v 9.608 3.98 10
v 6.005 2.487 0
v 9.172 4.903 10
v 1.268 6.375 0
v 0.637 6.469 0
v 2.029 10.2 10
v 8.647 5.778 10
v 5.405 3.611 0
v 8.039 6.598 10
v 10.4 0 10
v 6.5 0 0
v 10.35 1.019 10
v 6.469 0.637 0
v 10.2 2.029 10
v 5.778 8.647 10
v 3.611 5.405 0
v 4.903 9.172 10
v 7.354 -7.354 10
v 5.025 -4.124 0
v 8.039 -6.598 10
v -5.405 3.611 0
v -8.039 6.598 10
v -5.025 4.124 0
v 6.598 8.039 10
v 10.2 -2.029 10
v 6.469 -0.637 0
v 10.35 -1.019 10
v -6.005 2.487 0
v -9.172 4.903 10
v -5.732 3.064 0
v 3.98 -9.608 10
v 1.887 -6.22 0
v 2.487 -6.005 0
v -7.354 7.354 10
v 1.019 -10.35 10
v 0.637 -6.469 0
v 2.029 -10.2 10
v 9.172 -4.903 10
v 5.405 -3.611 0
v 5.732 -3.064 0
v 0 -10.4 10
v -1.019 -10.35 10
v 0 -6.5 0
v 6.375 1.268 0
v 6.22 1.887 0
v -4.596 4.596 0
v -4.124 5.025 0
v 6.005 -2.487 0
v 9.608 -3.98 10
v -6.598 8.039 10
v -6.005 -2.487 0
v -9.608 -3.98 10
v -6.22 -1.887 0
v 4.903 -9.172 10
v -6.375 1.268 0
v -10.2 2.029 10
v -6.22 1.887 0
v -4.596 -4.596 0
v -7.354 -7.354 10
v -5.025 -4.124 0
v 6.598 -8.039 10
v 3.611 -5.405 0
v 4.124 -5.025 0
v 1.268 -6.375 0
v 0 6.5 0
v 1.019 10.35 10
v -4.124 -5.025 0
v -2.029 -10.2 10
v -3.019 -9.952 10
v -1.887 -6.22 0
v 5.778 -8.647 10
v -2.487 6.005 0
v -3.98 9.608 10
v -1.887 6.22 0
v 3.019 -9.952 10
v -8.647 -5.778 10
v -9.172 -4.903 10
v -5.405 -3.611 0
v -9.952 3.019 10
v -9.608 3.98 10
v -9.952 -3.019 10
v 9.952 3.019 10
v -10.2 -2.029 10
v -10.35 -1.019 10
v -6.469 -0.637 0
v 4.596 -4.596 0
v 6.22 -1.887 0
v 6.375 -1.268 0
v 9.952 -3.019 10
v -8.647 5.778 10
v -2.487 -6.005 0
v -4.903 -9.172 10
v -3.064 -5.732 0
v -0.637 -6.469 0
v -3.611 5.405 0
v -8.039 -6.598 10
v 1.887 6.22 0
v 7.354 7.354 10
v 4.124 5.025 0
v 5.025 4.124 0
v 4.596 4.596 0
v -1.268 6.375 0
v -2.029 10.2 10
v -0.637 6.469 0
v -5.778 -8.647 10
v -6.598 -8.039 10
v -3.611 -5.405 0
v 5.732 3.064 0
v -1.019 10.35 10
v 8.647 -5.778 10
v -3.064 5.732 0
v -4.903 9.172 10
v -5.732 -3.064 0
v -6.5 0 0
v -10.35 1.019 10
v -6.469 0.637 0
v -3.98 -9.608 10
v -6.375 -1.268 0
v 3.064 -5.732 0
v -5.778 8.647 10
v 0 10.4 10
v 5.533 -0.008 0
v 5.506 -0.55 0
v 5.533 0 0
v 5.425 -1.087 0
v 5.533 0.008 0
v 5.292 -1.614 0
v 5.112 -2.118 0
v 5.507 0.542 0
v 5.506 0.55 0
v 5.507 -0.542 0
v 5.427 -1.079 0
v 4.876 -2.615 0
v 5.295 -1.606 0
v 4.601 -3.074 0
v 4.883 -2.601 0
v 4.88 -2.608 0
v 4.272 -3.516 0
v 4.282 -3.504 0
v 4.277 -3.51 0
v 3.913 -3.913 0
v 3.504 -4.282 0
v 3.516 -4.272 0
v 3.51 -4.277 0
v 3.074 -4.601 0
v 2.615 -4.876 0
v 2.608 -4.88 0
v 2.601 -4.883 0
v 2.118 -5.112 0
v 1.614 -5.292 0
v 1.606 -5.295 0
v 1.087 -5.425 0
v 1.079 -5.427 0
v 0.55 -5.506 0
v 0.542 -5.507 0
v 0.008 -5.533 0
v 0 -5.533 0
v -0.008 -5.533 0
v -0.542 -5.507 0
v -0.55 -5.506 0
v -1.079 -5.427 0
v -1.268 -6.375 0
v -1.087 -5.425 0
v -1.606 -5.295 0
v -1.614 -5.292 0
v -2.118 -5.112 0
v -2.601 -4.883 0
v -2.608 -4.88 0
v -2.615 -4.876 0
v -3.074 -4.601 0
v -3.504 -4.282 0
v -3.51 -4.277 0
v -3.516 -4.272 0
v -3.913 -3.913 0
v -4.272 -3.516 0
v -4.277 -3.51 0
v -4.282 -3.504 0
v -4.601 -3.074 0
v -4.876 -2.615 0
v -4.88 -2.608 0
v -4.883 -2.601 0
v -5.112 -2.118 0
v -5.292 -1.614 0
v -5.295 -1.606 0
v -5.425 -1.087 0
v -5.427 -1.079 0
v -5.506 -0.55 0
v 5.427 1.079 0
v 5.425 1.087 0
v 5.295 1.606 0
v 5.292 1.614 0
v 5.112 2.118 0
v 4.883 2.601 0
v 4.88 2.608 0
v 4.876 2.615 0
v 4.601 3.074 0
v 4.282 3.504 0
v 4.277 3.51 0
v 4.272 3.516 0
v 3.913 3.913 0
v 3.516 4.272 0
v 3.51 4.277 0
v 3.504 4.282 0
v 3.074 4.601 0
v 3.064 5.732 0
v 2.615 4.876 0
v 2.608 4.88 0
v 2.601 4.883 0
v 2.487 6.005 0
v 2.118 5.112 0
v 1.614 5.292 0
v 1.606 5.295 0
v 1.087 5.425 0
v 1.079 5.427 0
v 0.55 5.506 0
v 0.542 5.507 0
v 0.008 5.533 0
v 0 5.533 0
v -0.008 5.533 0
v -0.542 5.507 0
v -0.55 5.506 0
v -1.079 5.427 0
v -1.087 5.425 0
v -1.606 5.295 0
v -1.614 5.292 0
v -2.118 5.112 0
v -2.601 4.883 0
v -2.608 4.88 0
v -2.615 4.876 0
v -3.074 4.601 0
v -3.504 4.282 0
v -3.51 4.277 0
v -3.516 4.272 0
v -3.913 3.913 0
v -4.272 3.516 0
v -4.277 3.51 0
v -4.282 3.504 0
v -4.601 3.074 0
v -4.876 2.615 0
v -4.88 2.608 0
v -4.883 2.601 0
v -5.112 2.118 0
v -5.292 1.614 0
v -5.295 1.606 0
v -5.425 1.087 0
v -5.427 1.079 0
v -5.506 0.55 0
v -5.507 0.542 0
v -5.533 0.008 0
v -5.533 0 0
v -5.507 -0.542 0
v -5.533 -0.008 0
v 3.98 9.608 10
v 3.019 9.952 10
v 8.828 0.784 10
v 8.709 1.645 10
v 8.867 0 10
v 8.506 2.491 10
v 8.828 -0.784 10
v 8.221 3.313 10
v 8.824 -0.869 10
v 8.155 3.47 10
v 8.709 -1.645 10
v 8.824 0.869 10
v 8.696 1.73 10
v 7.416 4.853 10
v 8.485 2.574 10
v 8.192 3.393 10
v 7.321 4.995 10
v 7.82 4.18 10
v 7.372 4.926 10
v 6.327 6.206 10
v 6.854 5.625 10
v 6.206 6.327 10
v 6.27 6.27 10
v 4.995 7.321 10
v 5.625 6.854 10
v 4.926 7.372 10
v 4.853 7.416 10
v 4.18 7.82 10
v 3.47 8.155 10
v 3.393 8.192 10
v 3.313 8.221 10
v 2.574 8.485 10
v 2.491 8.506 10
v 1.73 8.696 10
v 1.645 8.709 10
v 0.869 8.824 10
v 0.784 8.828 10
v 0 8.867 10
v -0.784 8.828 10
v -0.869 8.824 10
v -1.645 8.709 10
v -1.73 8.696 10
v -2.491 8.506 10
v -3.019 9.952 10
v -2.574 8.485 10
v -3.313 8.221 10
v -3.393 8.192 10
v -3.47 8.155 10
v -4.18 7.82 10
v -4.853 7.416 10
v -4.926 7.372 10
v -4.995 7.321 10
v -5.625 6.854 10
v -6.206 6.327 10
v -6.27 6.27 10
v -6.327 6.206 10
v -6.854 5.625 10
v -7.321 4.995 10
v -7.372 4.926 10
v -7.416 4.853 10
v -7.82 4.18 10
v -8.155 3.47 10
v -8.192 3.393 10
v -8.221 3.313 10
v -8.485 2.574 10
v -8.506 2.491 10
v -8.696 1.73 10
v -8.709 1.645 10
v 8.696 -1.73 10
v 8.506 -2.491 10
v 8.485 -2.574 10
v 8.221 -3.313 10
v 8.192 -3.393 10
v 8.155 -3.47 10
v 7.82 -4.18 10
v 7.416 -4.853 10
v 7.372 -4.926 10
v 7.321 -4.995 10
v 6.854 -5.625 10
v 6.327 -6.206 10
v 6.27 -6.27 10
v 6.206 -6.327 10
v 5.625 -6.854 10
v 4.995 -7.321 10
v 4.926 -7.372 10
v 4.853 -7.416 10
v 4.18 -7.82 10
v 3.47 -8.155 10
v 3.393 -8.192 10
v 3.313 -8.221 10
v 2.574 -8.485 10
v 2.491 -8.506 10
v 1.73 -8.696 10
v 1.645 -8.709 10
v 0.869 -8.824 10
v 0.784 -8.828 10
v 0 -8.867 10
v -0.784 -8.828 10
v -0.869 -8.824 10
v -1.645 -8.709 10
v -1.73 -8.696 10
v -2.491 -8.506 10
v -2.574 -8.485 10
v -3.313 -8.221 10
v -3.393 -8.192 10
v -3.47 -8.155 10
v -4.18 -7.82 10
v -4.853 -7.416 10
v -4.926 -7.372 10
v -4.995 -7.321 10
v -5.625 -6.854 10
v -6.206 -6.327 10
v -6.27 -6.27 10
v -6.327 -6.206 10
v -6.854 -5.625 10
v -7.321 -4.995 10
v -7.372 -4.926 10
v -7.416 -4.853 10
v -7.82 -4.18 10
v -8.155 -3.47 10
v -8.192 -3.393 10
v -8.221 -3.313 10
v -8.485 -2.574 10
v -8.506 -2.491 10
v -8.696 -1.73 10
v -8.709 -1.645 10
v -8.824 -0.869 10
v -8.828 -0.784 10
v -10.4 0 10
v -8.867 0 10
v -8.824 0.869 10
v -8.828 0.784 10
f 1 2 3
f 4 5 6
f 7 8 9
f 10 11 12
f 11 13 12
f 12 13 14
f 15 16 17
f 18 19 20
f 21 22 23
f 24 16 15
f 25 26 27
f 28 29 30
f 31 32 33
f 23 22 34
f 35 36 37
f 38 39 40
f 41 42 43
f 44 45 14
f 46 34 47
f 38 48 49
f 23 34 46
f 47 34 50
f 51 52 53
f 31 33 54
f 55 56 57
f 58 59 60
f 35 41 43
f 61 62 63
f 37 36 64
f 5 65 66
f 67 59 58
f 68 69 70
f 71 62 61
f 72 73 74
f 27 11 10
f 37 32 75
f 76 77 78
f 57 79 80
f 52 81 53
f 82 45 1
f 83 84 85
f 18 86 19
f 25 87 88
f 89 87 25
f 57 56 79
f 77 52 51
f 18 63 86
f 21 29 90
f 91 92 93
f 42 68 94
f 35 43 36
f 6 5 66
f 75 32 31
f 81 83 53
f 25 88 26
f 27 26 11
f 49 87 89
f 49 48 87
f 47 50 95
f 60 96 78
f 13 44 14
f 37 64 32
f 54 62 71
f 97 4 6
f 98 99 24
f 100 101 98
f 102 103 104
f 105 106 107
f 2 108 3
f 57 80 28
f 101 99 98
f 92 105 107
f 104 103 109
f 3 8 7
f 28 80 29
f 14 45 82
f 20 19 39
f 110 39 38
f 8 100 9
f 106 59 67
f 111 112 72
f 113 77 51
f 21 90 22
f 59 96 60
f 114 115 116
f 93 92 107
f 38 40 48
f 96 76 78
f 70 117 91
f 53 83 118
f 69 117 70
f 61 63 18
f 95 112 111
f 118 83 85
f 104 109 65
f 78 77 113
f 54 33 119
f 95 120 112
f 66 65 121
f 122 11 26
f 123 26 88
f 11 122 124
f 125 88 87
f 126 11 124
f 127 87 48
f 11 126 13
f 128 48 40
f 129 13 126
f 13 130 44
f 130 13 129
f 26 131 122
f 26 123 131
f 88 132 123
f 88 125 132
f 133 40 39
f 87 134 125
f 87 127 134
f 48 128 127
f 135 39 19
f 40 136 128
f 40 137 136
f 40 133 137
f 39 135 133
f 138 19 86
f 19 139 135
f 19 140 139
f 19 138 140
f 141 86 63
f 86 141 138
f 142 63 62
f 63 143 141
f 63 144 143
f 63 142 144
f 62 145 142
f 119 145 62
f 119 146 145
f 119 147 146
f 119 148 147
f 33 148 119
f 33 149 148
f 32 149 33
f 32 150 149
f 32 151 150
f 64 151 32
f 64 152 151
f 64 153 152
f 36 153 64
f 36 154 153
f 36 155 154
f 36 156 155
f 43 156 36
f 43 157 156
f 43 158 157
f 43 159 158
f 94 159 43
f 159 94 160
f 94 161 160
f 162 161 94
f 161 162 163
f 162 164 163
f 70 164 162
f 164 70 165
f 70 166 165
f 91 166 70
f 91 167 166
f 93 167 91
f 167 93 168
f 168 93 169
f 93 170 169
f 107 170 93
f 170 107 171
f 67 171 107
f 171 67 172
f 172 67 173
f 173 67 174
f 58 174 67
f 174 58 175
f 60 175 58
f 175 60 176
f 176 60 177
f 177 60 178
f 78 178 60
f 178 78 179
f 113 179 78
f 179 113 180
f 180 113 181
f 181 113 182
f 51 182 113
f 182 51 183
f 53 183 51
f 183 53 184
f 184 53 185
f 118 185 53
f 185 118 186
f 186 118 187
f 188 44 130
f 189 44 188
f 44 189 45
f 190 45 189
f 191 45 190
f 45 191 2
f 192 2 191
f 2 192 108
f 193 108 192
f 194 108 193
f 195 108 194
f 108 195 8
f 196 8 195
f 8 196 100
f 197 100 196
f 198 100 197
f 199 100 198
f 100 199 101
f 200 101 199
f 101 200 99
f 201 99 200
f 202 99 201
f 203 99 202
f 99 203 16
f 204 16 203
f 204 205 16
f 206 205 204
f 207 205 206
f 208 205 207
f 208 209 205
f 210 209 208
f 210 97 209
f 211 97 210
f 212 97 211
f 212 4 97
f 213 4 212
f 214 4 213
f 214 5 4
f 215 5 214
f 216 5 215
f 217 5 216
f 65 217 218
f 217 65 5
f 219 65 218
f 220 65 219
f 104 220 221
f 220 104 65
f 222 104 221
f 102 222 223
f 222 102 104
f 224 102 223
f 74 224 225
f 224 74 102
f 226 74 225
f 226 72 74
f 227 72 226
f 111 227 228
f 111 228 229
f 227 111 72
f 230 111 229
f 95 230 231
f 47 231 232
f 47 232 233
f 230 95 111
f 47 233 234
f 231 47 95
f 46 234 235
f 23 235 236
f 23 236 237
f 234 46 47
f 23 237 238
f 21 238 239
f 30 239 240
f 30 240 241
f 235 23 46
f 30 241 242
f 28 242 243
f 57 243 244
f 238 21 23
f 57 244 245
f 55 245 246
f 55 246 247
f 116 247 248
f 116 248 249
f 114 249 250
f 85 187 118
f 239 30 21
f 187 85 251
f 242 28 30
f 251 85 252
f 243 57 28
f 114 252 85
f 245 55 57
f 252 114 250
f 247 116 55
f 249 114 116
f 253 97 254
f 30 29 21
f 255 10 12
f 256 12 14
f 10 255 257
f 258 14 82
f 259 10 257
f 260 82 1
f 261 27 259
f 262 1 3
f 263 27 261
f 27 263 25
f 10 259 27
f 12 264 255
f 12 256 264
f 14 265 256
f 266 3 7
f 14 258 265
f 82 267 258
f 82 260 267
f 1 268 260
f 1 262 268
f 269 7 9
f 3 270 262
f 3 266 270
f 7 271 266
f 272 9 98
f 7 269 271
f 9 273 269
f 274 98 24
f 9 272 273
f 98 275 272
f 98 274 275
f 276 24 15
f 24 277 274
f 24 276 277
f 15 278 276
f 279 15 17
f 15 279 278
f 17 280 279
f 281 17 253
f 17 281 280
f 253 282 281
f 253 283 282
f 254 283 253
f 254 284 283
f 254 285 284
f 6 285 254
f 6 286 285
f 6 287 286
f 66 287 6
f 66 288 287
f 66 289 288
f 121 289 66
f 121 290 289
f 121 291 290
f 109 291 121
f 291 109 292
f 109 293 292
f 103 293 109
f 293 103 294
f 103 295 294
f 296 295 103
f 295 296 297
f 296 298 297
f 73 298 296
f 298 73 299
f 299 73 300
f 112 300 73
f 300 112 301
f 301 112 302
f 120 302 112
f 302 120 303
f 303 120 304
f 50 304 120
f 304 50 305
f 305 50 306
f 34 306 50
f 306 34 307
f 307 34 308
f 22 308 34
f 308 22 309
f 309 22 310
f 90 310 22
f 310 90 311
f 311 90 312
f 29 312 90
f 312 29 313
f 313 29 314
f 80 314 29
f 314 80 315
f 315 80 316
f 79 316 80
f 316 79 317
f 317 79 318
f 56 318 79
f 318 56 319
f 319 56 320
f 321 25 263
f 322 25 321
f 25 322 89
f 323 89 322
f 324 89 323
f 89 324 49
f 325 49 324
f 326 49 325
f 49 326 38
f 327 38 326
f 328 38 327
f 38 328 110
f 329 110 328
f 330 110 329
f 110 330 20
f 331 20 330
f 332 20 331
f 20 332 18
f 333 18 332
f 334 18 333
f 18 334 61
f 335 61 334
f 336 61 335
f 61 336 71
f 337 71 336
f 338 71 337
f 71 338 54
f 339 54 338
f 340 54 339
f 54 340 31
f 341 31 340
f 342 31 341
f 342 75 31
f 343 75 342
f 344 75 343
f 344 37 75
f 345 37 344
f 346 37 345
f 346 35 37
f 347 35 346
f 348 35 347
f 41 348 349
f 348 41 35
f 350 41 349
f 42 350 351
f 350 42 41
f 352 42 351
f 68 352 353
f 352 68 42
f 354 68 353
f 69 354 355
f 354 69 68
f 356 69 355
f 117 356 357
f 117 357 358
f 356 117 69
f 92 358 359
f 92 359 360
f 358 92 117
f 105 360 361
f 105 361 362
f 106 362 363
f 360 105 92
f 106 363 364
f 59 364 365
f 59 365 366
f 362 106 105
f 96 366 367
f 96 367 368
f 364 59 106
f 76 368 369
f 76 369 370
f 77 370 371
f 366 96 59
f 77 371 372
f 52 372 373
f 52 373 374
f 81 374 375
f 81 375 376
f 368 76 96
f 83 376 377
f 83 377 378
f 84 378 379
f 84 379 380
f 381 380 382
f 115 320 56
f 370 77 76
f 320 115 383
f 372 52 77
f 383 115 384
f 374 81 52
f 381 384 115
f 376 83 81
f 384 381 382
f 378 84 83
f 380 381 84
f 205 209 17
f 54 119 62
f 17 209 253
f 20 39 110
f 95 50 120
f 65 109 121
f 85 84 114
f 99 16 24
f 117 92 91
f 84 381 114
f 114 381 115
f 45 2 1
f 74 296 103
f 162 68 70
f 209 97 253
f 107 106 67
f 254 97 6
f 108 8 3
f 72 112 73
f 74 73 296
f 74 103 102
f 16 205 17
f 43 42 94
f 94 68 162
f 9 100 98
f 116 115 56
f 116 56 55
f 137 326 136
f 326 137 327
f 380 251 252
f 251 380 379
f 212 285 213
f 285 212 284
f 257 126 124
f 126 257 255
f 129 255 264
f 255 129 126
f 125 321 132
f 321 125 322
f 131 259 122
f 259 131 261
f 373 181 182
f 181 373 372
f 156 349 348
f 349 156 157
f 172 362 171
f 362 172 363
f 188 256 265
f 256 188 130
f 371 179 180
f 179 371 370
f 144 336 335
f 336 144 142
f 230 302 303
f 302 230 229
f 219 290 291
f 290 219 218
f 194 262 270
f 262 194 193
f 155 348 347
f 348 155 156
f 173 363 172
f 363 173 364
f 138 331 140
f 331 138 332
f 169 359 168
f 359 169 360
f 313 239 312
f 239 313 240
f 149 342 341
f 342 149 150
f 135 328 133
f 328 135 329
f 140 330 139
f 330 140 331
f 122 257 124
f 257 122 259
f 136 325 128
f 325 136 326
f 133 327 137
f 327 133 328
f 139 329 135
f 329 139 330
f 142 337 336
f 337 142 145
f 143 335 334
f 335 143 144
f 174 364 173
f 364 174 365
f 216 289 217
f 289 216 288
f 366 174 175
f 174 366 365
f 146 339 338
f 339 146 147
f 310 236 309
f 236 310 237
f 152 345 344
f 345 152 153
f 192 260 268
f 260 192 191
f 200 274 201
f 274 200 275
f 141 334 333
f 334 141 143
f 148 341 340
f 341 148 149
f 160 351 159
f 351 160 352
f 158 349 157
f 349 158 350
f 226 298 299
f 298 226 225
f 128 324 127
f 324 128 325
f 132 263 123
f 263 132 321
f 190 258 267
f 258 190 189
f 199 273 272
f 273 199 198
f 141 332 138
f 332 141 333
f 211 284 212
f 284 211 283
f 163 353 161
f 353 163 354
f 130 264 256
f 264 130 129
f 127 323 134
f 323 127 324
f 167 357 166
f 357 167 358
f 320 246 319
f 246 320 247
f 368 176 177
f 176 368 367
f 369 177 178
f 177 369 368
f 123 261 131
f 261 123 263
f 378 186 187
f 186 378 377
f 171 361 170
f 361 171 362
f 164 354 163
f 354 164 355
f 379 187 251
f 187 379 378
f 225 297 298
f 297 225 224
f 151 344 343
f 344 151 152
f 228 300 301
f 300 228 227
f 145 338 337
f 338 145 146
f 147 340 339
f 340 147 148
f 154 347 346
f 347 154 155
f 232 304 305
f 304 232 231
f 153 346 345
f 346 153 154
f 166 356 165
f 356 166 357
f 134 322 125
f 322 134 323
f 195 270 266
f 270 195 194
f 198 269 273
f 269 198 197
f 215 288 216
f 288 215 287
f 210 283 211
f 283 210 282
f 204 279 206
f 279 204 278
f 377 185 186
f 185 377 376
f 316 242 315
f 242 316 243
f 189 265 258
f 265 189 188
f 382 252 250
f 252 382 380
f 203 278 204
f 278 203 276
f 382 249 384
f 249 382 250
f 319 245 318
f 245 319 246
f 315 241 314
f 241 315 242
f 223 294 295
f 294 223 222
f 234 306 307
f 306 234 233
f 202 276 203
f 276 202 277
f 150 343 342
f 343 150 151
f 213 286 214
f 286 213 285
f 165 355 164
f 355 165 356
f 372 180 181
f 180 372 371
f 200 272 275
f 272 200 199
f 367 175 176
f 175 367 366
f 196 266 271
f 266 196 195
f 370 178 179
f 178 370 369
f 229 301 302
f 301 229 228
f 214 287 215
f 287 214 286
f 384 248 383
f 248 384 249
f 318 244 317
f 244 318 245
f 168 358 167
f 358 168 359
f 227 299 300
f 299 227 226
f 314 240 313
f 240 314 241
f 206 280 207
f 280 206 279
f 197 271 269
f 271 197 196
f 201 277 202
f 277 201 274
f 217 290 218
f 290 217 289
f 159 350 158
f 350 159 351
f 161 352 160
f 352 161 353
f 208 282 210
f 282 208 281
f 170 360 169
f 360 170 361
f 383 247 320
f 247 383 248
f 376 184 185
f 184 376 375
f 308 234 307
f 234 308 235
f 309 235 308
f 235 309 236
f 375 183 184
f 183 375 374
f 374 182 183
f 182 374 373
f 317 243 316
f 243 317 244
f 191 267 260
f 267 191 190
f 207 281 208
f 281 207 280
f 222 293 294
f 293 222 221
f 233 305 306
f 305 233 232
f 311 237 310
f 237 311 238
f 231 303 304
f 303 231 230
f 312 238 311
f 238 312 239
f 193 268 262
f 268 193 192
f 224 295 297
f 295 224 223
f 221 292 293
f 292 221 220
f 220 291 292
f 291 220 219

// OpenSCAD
lower_d = 30;
lower_h = 25;
hrdlo_d = 15.4;
hrdlo_h=5;
inner = 11;
diameter = 140;
$fn = 64;

module trychtyr() {
difference() {
    cylinder(d1 = lower_d,d2=diameter, h=100);
    translate([0,0,-1]) cylinder(d=lower_d, h=lower_h+1);
    translate([0,0,lower_h-1]) cylinder(d=hrdlo_d, h=hrdlo_h+1);
    translate([0,0,lower_h+hrdlo_h-1]) cylinder(d=inner, h=hrdlo_h+1);
    translate([0,0,lower_h+hrdlo_h+1])  cylinder(d1 = inner, d2=diameter-2, h=100-lower_h-hrdlo_h+2);
}
}

module korekce() {
    difference() {
        cylinder(d1=inner+2, d2=20.8,h=10);
        translate([0,0,-.1]) cylinder(d1=inner, d2=19,h=12);
    }
}

//trychtyr();
korekce();
